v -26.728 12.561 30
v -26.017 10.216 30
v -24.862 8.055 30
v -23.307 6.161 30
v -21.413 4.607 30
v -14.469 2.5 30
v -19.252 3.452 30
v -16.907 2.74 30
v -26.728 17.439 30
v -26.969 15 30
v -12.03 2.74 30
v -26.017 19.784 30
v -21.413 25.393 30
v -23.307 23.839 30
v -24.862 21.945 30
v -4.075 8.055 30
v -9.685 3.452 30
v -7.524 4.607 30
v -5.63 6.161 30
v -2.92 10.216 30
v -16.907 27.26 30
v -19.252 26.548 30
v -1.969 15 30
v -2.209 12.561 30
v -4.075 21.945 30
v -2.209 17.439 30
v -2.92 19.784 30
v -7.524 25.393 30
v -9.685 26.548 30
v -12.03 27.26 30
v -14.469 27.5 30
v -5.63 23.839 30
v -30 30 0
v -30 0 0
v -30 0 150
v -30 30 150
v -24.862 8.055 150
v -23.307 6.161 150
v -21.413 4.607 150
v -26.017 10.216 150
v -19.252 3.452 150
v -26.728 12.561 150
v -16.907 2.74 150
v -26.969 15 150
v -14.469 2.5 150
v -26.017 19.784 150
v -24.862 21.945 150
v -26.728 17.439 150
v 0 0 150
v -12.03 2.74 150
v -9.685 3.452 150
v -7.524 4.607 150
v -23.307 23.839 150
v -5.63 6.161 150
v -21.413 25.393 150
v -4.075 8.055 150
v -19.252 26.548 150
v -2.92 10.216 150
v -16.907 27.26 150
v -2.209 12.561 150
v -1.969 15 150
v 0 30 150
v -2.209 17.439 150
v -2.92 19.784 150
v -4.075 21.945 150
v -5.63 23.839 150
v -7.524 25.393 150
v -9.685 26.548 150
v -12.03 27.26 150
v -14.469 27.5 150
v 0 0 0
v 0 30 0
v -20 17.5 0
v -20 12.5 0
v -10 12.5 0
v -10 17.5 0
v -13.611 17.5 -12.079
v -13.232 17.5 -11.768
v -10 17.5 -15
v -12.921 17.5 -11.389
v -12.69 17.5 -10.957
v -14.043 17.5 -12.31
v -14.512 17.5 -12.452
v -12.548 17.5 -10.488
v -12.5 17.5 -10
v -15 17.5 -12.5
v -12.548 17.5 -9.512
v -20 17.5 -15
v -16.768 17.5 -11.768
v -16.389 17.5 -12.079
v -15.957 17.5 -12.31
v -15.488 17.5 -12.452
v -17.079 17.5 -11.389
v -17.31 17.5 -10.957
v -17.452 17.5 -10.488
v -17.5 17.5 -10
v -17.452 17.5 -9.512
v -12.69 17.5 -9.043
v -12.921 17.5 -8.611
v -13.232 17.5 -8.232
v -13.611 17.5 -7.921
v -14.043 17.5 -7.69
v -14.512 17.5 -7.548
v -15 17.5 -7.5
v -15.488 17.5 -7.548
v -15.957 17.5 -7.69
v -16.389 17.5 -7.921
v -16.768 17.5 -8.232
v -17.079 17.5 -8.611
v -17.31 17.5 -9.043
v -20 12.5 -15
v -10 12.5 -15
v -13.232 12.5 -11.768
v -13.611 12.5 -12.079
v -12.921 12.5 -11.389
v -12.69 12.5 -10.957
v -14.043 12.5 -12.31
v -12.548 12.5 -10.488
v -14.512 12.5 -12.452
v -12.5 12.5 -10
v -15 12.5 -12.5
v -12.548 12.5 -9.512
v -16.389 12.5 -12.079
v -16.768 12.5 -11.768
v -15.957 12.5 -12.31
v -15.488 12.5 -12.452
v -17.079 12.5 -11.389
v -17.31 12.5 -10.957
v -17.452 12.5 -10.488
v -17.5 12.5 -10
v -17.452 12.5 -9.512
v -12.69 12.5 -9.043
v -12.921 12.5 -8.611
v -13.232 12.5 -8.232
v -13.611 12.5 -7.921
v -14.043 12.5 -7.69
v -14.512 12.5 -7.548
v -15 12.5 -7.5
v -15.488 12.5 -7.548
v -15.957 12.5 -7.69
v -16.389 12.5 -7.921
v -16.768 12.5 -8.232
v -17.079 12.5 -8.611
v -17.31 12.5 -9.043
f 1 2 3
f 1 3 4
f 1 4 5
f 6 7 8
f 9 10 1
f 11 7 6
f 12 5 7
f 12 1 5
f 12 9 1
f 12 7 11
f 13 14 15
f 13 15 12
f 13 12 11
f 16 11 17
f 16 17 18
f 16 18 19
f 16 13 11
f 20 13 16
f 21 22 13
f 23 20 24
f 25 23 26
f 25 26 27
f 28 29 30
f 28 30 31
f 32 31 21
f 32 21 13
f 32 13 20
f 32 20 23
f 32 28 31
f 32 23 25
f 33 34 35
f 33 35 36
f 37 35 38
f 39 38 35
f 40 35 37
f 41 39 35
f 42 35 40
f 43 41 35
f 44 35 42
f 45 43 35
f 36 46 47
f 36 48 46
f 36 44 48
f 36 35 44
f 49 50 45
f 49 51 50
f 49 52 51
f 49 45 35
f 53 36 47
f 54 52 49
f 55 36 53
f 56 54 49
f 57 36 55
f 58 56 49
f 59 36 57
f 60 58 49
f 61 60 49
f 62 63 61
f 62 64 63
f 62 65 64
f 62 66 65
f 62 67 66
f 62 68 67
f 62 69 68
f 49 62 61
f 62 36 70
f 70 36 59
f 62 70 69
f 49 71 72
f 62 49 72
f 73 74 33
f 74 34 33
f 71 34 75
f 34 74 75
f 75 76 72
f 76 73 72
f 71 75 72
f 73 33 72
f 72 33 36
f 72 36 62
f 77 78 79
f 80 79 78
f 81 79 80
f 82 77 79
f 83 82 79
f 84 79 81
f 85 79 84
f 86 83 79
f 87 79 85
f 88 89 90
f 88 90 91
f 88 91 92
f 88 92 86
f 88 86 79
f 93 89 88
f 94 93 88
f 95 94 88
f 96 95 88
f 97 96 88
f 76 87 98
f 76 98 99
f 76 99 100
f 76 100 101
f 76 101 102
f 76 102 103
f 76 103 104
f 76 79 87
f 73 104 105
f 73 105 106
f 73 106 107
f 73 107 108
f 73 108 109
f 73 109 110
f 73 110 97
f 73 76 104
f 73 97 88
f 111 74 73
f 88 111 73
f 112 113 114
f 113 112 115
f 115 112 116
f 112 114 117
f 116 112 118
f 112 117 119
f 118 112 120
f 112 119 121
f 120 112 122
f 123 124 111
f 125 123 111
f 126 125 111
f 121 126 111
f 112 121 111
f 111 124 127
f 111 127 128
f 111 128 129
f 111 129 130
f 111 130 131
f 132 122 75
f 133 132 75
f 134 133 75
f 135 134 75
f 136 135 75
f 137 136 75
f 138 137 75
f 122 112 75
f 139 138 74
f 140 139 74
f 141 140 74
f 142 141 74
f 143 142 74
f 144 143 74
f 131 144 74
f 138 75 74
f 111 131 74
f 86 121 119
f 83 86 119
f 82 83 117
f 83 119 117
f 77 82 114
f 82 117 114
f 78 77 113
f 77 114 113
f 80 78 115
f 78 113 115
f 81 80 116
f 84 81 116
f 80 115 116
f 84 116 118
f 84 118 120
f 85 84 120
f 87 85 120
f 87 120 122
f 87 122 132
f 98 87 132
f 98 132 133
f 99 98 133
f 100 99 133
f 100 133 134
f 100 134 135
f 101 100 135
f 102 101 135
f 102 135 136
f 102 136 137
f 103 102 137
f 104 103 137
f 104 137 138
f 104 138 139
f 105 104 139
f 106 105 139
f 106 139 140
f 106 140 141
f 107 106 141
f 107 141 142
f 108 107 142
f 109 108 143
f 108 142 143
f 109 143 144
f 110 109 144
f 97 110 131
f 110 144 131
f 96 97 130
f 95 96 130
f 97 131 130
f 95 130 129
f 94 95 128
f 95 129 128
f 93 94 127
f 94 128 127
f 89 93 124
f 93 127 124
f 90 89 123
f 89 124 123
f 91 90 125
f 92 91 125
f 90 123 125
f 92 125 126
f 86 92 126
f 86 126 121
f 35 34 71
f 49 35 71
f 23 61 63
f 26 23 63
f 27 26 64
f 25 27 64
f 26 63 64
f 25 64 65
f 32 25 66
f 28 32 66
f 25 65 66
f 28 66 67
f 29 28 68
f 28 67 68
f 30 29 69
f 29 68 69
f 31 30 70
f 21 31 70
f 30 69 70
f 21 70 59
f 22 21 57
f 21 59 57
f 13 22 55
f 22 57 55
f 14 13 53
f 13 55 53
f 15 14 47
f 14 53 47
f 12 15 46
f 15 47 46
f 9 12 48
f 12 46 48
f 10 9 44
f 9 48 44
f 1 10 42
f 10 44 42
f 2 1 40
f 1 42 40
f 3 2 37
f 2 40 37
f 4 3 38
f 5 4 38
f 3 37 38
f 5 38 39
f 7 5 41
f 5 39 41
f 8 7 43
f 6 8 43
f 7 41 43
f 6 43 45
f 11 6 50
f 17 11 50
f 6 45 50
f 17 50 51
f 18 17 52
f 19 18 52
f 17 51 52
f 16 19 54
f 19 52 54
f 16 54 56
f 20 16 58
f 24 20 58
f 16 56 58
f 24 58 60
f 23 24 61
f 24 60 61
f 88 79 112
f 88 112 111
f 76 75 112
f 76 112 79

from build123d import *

# Parameters (mm, degrees)
SKETCH1_W           = 30
SKETCH1_H           = 30
BOSS_EXTRUDE1_DEPTH = 150
SKETCH2_R           = 12.5
CUT_EXTRUDE1_DEPTH  = 120
SKETCH3_W           = 10
SKETCH3_H           = 5
BOSS_EXTRUDE2_DEPTH = 15
SKETCH4_R           = 2.5
CUT_EXTRUDE2_DEPTH  = 10


with BuildPart() as part:
    # Sketch1 → Boss-Extrude1 (new body)
    with BuildSketch(Plane.XY):
        with Locations((-15, 15)):
            Rectangle(SKETCH1_W, SKETCH1_H)
    extrude(amount=BOSS_EXTRUDE1_DEPTH)

    # Sketch2 → Cut-Extrude1 (cut)
    with BuildSketch(Plane.XY.offset(150)):
        with Locations((-14.468504341, 15)):
            Circle(SKETCH2_R)
    extrude(amount=-CUT_EXTRUDE1_DEPTH, mode=Mode.SUBTRACT)

    # Sketch3 → Boss-Extrude2 (add)
    with BuildSketch(Plane(origin=(0, 0, 0), x_dir=(-1, 0, 0), z_dir=(0, 0, -1))):
        with Locations((15, 15)):
            Rectangle(SKETCH3_W, SKETCH3_H)
    extrude(amount=BOSS_EXTRUDE2_DEPTH)

    # Sketch4 → Cut-Extrude2 (cut)
    with BuildSketch(Plane.XZ.offset(-12.5)):
        with Locations((-15, -10)):
            Circle(SKETCH4_R)
    extrude(amount=-CUT_EXTRUDE2_DEPTH, mode=Mode.SUBTRACT)


solid = part.part
